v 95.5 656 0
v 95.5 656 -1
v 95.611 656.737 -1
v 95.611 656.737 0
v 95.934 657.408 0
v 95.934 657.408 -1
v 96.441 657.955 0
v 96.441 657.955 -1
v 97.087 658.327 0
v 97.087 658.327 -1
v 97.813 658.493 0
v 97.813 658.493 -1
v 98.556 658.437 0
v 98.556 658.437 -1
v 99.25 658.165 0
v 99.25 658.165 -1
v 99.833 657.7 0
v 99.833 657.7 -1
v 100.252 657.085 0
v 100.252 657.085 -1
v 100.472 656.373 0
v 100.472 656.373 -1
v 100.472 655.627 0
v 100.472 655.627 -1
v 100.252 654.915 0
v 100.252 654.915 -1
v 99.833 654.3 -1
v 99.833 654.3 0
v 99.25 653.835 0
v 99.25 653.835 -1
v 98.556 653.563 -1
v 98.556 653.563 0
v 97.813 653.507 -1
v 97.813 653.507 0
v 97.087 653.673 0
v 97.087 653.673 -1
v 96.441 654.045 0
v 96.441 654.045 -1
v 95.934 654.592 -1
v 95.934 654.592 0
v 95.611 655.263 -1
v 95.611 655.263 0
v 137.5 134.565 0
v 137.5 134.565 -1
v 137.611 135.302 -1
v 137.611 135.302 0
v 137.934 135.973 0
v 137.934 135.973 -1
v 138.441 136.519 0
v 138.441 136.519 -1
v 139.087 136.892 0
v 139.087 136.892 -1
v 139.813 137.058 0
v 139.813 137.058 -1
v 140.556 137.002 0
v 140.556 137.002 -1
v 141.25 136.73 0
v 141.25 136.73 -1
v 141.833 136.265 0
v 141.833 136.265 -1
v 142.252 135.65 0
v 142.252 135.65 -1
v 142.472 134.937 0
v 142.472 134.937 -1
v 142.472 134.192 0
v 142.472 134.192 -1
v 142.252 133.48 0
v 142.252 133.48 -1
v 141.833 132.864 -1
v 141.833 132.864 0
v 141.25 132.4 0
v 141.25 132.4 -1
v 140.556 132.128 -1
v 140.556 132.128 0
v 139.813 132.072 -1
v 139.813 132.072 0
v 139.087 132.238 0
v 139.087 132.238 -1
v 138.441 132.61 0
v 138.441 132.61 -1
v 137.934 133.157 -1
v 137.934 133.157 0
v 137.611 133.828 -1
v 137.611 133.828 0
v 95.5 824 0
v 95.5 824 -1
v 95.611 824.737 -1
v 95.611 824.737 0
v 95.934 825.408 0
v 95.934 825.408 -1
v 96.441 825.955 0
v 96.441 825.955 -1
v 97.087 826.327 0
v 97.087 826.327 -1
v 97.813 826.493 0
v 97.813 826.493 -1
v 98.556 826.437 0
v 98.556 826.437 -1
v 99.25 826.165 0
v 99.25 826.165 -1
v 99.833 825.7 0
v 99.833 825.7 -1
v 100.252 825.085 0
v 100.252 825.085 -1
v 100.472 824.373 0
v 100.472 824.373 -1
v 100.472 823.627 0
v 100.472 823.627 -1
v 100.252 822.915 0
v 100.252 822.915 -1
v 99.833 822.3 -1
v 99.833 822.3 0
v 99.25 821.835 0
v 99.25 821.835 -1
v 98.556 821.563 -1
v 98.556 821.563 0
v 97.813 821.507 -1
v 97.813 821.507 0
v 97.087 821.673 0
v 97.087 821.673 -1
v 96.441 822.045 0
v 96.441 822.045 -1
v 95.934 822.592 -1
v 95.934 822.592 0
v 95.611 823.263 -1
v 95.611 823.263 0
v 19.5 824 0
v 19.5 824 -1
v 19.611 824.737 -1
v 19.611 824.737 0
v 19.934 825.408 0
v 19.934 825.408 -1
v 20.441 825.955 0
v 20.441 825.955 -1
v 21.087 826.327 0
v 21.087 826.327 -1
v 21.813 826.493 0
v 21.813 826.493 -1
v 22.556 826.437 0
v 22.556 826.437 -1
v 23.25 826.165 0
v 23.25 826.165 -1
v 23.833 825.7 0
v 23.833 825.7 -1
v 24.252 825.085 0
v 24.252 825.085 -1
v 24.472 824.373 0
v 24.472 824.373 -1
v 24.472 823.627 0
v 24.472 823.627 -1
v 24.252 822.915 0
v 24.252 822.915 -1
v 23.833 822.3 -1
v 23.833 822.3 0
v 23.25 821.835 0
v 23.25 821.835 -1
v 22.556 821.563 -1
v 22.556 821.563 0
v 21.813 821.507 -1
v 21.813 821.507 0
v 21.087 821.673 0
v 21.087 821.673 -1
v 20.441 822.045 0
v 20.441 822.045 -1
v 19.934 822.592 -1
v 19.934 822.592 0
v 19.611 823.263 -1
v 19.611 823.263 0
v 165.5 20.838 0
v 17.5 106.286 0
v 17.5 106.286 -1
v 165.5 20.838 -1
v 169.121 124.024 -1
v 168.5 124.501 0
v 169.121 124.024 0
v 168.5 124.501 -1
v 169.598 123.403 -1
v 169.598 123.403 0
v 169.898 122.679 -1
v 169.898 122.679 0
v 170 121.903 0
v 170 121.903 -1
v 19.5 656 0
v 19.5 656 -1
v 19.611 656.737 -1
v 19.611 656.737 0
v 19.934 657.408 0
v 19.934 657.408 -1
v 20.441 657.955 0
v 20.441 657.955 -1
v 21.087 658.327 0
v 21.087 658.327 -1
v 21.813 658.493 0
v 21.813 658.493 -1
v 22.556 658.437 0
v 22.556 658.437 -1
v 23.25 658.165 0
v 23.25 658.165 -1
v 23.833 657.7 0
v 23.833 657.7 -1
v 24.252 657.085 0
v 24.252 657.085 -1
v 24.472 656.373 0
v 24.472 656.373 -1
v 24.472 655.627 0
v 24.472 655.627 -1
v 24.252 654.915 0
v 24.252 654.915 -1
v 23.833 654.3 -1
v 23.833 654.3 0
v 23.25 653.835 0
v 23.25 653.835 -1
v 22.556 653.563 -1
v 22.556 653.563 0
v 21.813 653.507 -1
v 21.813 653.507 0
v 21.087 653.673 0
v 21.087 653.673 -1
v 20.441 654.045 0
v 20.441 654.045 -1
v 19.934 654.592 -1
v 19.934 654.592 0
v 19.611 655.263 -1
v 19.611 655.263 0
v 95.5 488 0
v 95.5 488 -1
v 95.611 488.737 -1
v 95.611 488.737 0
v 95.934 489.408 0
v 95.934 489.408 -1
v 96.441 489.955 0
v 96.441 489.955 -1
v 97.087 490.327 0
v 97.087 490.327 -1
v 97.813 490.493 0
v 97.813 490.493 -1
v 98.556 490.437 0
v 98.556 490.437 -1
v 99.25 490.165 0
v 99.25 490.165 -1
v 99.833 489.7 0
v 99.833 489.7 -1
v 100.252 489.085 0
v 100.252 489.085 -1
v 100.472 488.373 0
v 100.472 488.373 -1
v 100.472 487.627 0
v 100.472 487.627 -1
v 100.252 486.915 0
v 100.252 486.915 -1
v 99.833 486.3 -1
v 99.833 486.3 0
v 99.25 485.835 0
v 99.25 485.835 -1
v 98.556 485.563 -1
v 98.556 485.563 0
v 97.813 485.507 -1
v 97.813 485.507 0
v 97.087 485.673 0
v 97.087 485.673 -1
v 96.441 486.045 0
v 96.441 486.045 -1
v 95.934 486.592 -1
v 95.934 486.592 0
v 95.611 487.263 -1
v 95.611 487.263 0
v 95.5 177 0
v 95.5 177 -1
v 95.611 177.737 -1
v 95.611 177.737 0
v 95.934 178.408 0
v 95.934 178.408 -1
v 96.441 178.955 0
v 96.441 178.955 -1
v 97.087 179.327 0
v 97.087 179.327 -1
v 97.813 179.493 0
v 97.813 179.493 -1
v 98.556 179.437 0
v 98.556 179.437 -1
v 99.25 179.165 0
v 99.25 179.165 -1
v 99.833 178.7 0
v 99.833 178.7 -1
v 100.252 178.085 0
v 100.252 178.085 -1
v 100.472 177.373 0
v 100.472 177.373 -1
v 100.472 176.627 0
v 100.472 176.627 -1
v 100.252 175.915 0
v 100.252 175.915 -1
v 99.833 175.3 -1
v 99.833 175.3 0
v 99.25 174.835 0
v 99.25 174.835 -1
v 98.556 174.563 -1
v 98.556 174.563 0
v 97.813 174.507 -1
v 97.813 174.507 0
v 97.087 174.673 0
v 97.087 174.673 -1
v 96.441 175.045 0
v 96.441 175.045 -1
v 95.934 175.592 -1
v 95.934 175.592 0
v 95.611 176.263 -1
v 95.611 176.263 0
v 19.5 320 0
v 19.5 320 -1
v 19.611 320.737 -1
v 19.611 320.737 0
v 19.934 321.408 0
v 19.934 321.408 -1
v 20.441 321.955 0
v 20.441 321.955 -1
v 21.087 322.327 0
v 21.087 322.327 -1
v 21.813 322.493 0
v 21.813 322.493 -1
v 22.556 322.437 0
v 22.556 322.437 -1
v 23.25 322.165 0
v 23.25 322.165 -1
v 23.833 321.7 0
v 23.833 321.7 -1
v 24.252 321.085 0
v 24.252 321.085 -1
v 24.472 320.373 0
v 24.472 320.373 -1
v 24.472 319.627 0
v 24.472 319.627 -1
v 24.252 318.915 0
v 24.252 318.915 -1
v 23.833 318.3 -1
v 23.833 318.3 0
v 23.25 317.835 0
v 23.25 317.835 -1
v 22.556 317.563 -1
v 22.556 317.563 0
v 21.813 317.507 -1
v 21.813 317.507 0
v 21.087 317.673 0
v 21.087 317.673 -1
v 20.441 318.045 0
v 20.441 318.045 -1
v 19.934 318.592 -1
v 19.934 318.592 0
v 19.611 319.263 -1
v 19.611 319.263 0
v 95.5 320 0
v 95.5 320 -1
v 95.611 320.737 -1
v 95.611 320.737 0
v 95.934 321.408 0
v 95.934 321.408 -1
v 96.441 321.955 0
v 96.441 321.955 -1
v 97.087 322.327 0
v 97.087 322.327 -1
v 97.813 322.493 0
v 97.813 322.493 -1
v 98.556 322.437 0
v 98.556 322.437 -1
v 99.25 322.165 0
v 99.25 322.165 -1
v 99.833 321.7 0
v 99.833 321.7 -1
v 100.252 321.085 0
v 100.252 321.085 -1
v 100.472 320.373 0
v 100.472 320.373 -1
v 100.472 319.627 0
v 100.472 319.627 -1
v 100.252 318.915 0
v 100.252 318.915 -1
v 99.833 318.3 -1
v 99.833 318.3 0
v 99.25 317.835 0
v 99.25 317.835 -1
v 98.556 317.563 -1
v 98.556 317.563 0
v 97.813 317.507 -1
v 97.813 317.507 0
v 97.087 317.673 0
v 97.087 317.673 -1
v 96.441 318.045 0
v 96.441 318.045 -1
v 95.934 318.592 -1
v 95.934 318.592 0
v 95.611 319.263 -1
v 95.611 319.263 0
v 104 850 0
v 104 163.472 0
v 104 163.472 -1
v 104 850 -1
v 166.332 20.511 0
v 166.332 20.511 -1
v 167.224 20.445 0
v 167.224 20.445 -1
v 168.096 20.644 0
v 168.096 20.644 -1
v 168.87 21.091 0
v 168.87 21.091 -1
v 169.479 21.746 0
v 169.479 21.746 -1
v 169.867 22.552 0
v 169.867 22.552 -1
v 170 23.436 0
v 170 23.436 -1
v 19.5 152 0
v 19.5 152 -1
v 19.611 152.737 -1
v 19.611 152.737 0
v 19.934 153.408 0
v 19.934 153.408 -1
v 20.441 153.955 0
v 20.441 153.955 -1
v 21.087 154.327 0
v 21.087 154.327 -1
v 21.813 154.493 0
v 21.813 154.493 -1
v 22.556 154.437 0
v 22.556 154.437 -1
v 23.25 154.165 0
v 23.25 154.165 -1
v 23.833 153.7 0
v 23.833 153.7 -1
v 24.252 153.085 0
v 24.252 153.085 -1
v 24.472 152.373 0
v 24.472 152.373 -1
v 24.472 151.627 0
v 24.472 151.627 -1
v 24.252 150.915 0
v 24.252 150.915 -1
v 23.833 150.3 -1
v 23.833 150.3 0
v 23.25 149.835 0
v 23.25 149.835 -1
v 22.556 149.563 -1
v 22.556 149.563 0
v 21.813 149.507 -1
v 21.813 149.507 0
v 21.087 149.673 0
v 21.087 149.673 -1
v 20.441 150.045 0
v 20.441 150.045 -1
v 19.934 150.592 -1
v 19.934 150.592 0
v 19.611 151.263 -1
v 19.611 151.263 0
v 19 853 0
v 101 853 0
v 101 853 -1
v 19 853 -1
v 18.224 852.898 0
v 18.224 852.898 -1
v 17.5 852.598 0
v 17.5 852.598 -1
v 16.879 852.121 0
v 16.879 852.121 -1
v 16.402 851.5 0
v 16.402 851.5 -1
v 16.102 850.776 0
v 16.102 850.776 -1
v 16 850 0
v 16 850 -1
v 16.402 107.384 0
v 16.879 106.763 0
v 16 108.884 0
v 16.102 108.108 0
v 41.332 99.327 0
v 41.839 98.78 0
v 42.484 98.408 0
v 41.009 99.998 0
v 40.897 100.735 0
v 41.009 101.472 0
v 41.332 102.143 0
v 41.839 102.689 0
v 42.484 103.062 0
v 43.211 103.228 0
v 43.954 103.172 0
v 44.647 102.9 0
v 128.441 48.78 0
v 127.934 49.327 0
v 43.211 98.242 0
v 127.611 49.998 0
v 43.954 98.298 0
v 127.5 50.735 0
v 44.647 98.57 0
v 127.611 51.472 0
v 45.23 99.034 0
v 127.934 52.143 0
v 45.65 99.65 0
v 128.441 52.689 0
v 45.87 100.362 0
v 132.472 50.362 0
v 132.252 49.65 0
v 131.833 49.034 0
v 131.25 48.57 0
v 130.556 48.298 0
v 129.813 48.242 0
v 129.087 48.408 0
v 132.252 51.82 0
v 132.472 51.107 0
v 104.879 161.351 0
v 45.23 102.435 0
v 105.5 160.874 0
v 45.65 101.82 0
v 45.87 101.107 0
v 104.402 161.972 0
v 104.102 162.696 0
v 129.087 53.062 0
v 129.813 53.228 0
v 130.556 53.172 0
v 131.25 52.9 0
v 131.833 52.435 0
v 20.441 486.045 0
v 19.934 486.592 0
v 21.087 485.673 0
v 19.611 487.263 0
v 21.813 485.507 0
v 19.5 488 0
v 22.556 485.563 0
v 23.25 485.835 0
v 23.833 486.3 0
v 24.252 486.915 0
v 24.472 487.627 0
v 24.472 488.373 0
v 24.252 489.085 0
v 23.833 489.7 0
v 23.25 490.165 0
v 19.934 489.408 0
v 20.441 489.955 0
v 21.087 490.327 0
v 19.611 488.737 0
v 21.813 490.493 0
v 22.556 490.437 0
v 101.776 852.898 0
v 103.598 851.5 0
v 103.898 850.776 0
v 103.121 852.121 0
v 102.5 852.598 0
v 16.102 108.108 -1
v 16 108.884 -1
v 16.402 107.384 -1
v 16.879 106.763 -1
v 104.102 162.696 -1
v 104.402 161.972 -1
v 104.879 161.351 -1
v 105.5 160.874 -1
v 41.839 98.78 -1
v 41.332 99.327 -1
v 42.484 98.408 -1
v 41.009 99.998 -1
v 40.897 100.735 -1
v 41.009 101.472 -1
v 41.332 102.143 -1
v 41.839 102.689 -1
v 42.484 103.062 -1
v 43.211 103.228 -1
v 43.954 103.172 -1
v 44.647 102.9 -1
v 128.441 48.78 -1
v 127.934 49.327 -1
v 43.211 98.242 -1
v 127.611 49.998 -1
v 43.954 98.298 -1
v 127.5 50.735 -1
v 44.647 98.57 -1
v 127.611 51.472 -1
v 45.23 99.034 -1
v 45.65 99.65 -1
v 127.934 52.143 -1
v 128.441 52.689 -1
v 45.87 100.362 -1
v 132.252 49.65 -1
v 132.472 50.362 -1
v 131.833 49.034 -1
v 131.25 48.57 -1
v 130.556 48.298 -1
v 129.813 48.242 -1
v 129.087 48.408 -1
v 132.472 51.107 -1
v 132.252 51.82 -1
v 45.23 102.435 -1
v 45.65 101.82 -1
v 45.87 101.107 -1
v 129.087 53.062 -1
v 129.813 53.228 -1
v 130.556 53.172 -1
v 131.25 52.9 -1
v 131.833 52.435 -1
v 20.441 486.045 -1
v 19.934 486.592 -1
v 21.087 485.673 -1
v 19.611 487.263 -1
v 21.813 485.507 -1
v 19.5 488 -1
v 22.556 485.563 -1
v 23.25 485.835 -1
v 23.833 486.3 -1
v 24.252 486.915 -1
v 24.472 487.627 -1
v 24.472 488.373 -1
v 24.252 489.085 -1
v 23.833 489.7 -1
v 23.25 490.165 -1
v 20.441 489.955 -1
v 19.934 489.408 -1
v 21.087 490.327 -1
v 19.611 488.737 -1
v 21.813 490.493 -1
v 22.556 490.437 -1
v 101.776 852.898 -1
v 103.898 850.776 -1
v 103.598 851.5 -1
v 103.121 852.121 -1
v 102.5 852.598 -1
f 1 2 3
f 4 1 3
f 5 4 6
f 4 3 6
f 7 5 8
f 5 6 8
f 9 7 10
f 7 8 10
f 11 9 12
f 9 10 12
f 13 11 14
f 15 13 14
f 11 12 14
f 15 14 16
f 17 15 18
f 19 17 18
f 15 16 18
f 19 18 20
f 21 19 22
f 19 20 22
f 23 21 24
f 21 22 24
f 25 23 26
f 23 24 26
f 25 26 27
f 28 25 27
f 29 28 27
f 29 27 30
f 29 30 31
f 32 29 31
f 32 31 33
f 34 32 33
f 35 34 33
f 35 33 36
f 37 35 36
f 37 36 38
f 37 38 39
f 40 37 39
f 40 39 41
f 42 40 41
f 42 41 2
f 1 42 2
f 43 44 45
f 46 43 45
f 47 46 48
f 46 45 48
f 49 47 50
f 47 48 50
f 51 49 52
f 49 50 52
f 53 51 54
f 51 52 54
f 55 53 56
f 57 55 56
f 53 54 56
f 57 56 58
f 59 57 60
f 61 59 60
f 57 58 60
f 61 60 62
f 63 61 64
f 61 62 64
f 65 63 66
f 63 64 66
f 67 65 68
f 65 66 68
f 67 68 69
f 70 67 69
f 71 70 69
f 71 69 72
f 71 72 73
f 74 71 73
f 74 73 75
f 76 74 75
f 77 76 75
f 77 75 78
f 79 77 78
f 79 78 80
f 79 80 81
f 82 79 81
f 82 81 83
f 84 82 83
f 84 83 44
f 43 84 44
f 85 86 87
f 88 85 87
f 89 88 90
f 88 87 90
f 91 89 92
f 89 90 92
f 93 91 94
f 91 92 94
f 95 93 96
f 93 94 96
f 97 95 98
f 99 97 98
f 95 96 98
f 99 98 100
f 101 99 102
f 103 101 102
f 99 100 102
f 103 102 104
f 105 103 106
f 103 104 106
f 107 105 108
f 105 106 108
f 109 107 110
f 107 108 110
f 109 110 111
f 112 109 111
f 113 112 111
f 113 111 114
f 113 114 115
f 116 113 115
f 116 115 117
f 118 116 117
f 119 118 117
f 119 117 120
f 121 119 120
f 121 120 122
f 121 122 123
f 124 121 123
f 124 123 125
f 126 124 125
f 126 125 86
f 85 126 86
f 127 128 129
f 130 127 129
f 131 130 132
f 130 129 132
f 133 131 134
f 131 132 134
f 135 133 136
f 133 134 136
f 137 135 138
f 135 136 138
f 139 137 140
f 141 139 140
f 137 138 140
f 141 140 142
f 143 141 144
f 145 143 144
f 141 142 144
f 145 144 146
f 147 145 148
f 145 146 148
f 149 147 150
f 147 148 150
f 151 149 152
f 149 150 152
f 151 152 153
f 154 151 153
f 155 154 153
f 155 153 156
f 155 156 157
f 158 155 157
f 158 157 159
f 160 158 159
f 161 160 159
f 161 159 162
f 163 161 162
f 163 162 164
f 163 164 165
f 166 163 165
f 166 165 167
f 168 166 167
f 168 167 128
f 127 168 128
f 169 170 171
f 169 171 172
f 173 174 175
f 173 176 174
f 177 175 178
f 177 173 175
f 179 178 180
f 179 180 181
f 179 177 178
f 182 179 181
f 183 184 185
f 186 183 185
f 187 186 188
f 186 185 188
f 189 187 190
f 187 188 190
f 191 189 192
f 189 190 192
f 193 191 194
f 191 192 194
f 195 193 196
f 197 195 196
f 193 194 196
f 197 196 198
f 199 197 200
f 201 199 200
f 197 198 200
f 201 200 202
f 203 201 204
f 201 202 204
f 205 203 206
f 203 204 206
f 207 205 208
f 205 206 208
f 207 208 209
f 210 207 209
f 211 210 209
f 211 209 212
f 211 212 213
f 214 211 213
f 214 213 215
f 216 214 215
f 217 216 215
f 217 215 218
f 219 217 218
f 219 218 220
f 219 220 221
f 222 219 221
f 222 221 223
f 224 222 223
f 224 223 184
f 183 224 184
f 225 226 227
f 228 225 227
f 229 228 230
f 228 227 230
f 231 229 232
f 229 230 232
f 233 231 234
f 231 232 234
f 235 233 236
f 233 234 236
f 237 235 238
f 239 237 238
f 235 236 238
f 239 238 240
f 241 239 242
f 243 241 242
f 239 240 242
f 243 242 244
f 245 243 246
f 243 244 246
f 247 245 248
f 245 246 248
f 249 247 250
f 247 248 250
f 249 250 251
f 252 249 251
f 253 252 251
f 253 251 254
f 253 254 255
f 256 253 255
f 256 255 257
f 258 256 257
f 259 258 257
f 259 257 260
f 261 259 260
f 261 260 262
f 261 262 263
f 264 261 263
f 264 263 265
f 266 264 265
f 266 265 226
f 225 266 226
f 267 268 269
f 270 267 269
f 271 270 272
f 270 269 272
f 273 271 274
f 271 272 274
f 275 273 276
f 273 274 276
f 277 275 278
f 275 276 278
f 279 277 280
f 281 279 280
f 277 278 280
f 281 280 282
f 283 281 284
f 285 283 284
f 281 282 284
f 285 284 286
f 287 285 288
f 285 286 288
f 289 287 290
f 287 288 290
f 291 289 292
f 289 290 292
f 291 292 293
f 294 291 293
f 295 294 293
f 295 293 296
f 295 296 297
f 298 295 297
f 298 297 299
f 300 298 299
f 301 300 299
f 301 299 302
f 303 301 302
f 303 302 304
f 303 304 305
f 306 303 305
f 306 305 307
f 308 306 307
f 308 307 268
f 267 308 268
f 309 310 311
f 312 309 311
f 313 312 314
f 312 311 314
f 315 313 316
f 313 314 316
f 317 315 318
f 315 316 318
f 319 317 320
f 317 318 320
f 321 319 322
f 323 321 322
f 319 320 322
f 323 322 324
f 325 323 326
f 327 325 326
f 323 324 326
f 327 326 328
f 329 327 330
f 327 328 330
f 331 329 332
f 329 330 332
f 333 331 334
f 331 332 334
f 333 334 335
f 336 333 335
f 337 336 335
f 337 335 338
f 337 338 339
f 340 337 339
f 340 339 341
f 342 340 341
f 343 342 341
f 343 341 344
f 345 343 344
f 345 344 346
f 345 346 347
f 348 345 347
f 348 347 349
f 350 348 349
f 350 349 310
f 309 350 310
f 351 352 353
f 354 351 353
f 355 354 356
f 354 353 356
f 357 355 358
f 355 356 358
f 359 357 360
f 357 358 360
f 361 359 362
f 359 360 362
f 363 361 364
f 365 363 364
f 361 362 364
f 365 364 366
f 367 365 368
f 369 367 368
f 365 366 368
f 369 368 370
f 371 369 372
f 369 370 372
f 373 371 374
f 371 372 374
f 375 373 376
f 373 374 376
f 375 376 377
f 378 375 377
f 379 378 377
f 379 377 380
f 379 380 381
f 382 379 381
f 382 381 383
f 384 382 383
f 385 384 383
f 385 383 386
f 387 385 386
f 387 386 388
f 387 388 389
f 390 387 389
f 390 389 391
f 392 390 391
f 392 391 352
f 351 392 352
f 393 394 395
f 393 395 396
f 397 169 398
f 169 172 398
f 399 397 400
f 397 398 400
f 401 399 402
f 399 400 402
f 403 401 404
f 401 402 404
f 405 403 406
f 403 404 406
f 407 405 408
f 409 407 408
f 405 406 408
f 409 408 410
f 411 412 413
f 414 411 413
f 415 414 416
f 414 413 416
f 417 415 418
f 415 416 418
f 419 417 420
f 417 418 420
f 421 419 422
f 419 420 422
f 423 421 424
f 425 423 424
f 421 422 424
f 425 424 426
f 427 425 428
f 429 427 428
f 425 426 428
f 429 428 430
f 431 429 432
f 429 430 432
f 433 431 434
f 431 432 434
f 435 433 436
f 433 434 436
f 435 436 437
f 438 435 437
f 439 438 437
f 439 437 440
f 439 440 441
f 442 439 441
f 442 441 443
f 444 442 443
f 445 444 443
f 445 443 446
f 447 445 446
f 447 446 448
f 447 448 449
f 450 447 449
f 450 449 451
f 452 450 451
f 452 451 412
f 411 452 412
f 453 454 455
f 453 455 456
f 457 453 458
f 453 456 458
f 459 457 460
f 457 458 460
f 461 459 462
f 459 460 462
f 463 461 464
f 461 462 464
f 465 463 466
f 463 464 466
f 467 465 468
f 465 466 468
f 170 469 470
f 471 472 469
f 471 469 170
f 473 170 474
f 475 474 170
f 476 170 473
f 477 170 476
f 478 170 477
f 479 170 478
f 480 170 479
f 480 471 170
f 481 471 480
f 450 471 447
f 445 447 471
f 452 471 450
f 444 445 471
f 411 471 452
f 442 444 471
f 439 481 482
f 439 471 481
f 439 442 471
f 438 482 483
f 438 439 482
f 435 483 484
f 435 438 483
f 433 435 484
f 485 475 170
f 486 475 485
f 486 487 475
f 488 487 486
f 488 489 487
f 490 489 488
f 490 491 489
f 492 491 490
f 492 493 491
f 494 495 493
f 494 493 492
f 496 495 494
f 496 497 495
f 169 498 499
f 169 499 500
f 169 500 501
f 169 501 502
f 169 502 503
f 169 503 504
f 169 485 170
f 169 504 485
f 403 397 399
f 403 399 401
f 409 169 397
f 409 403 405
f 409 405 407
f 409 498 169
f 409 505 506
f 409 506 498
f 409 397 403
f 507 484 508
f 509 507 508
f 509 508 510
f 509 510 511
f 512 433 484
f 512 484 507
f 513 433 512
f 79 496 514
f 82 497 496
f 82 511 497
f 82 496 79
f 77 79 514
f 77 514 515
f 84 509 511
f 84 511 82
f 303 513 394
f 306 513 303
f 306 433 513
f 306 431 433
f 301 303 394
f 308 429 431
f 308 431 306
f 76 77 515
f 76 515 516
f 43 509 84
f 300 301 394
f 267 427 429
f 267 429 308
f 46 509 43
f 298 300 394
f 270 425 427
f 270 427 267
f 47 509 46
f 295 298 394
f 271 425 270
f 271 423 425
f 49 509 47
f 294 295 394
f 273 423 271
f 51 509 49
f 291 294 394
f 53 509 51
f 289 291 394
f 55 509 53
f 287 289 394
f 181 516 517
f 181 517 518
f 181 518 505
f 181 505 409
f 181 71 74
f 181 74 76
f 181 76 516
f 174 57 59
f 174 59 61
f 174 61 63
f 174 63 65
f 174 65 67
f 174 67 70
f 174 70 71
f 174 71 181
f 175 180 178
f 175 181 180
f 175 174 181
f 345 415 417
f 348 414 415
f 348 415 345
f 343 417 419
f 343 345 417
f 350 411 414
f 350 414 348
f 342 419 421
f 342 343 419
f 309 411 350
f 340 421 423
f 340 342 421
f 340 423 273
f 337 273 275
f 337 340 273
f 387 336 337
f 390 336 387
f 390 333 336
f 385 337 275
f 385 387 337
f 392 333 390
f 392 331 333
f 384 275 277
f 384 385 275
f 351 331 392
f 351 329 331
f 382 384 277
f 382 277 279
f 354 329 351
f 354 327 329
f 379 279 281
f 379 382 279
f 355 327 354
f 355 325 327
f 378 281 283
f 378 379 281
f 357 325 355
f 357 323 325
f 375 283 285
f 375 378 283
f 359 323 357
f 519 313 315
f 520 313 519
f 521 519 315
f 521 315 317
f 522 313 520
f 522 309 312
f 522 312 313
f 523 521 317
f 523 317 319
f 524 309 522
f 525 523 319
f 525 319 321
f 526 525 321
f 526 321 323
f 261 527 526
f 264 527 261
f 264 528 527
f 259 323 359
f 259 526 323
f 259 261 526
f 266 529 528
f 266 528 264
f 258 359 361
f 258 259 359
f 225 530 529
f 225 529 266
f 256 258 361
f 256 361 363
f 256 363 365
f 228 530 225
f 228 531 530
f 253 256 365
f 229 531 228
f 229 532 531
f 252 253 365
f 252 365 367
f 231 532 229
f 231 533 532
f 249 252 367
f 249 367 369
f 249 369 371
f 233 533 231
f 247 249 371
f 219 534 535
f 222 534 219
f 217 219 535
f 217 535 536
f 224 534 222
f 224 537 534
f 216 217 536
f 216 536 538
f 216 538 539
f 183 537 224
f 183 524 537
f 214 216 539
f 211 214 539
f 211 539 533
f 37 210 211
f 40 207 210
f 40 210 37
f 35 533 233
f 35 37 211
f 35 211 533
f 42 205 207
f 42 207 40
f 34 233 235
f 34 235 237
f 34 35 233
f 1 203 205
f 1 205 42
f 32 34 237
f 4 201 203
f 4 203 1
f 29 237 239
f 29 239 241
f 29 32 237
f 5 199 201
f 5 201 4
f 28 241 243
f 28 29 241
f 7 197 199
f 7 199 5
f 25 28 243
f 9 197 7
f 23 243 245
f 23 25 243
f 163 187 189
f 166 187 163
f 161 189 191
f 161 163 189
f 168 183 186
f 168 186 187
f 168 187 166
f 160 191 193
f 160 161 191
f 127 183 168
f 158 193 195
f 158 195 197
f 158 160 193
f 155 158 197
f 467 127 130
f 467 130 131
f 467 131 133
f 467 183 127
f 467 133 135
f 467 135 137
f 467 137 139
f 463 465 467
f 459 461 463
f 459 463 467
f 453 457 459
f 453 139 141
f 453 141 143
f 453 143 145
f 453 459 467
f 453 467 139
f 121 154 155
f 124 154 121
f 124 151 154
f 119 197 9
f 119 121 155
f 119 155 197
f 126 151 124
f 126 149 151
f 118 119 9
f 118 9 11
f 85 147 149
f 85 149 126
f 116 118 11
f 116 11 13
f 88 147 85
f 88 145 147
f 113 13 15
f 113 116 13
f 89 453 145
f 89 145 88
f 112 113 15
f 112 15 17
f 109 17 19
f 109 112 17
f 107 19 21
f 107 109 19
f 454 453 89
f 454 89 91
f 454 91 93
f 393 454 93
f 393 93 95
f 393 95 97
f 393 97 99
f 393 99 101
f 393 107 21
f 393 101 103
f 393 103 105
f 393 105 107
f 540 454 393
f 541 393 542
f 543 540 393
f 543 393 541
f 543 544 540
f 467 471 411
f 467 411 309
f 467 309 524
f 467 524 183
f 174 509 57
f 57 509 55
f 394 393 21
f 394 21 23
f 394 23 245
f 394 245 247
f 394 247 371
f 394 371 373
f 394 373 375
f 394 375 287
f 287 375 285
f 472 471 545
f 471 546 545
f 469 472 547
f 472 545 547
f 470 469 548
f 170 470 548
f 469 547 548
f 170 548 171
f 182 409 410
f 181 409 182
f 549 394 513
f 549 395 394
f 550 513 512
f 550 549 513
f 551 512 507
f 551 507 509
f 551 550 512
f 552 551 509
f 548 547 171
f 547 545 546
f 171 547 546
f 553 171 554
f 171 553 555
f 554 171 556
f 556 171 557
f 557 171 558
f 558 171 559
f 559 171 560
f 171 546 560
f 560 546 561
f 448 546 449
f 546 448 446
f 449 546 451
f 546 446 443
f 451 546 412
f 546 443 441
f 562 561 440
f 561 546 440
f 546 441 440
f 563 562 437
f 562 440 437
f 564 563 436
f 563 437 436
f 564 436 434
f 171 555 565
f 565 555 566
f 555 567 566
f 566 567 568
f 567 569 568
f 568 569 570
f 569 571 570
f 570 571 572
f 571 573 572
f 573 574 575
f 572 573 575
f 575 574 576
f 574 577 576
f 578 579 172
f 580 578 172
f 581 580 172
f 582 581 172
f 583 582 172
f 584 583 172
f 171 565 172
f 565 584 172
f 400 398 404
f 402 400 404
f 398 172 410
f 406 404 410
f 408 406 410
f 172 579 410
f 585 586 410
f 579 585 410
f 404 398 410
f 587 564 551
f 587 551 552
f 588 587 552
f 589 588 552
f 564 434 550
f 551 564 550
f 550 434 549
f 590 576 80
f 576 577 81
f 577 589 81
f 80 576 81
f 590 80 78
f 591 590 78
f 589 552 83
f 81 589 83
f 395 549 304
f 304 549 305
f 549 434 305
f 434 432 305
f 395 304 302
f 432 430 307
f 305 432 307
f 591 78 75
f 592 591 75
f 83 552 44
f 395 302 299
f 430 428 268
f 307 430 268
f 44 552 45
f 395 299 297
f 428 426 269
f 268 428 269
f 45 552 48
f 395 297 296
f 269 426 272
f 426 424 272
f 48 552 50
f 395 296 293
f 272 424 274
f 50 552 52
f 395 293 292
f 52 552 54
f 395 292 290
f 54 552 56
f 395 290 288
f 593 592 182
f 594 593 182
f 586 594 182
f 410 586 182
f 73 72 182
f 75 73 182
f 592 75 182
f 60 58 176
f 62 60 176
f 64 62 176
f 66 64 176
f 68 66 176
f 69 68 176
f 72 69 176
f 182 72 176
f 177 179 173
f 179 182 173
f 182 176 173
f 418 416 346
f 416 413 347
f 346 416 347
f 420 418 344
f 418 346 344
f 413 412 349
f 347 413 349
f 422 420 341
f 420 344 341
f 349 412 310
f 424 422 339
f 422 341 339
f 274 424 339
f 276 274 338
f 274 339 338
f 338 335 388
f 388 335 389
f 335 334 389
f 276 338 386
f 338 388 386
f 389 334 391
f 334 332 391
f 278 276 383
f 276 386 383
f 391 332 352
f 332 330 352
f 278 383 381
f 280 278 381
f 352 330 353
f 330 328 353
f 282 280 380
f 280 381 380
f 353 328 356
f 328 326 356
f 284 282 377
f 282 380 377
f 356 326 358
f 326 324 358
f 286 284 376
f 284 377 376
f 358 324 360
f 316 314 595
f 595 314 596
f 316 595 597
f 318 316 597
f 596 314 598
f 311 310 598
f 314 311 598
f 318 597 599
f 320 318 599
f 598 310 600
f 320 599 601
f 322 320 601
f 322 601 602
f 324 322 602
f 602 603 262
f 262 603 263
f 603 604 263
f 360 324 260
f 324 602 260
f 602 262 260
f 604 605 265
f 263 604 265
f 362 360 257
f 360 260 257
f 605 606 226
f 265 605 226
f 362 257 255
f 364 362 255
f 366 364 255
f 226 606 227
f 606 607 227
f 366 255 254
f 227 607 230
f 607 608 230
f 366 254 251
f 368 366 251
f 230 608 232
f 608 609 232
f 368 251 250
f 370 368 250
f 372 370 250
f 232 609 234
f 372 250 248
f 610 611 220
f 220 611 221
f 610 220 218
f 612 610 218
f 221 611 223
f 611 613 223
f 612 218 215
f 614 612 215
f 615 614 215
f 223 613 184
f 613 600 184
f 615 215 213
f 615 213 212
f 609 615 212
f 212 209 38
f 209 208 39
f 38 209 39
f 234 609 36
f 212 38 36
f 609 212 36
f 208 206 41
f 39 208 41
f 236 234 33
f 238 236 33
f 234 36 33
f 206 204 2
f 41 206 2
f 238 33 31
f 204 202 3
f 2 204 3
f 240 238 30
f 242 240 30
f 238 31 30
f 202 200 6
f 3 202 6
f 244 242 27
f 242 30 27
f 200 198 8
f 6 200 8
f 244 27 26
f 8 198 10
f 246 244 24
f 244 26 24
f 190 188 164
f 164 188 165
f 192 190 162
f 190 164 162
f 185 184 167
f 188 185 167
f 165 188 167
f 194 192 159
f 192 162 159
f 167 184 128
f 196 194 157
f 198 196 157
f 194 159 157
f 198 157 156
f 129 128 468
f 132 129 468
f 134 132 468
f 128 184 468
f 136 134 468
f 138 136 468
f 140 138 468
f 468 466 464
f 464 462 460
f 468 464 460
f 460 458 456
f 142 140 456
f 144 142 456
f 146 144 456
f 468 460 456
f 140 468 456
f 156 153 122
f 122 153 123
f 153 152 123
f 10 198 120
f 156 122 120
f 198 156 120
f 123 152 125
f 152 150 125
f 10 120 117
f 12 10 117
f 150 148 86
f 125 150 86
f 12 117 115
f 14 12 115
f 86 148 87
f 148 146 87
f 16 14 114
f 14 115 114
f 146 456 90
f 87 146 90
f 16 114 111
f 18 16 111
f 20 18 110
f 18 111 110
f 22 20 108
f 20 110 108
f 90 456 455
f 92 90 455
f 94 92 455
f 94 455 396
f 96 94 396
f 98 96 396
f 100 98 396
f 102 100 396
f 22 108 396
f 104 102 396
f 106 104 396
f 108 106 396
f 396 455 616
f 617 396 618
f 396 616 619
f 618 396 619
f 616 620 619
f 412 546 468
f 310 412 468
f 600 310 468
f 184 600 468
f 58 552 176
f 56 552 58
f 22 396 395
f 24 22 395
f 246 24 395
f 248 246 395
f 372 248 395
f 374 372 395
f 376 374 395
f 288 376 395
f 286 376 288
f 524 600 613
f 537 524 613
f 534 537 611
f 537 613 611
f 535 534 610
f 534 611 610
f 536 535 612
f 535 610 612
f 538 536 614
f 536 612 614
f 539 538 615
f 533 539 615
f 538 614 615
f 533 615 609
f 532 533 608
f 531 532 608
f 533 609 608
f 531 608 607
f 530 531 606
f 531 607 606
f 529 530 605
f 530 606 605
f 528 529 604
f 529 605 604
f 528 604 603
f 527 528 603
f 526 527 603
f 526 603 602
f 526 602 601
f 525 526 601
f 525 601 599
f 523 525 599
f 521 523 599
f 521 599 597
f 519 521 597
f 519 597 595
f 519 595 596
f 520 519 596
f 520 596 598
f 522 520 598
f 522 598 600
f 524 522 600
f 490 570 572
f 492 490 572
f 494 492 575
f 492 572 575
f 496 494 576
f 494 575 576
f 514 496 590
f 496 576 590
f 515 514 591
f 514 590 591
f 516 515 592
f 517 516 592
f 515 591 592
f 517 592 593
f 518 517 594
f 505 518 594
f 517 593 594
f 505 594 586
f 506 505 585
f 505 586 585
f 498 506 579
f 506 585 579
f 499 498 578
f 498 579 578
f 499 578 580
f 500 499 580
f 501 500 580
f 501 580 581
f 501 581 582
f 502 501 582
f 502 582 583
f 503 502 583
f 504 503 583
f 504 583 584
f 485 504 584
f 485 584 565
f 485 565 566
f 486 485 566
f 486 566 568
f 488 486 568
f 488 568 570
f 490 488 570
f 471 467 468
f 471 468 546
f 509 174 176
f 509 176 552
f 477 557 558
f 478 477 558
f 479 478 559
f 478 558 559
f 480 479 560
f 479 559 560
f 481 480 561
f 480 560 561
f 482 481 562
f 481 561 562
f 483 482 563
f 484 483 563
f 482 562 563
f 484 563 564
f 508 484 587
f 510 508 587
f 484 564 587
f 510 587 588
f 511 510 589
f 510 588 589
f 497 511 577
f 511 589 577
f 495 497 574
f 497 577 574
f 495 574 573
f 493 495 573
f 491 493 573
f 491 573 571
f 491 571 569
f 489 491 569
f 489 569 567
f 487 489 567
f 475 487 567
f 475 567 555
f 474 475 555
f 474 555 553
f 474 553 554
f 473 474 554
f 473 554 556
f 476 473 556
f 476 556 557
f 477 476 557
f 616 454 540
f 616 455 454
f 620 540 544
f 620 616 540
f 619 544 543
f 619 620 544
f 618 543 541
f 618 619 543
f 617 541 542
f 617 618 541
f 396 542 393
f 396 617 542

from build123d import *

# Parameters (mm, degrees)
BASE_FLANGE1_DEPTH = 1
SKETCH2_R          = 2.5
CUT_EXTRUDE1_DEPTH = 10
FILLET1_R          = 3


# Sheet-metal steps are written as plain solids
with BuildPart() as part:
    # Sketch1 → Base-Flange1 (new body)
    with BuildSketch(Plane.XY):
        Polygon((104, 853), (16, 853), (16, 107.151941455), (170, 18.24), (170, 123.634882233), (104, 161.74), align=None)
    extrude(amount=-BASE_FLANGE1_DEPTH)

    # Sketch2 → Cut-Extrude1 (cut)
    with BuildSketch(Plane(origin=(0, 0, -1), x_dir=(-1, 0, 0), z_dir=(0, 0, -1))):
        with Locations((-22, 824)):
            Circle(SKETCH2_R)
        with Locations((-98, 824)):
            Circle(SKETCH2_R)
        with Locations((-98, 656)):
            Circle(SKETCH2_R)
        with Locations((-98, 488)):
            Circle(SKETCH2_R)
        with Locations((-98, 320)):
            Circle(SKETCH2_R)
        with Locations((-22, 656)):
            Circle(SKETCH2_R)
        with Locations((-22, 488)):
            Circle(SKETCH2_R)
        with Locations((-22, 320)):
            Circle(SKETCH2_R)
        with Locations((-22, 152)):
            Circle(SKETCH2_R)
        with Locations((-98, 177)):
            Circle(SKETCH2_R)
        with Locations((-140, 134.564882233)):
            Circle(SKETCH2_R)
        with Locations((-130, 50.734882233)):
            Circle(SKETCH2_R)
        with Locations((-43.397459622, 100.734882233)):
            Circle(SKETCH2_R)
    extrude(amount=-CUT_EXTRUDE1_DEPTH, mode=Mode.SUBTRACT)

    # Fillet1
    fillet1_edges = [part.edges().sort_by_distance(p)[0] for p in [
        (104, 161.74, -0.5),
        (170, 123.634882233, -0.5),
        (170, 18.24, -0.5),
        (16, 107.151941455, -0.5),
        (16, 853, -0.5),
        (104, 853, -0.5),
    ]]
    fillet(fillet1_edges, radius=FILLET1_R)


solid = part.part
